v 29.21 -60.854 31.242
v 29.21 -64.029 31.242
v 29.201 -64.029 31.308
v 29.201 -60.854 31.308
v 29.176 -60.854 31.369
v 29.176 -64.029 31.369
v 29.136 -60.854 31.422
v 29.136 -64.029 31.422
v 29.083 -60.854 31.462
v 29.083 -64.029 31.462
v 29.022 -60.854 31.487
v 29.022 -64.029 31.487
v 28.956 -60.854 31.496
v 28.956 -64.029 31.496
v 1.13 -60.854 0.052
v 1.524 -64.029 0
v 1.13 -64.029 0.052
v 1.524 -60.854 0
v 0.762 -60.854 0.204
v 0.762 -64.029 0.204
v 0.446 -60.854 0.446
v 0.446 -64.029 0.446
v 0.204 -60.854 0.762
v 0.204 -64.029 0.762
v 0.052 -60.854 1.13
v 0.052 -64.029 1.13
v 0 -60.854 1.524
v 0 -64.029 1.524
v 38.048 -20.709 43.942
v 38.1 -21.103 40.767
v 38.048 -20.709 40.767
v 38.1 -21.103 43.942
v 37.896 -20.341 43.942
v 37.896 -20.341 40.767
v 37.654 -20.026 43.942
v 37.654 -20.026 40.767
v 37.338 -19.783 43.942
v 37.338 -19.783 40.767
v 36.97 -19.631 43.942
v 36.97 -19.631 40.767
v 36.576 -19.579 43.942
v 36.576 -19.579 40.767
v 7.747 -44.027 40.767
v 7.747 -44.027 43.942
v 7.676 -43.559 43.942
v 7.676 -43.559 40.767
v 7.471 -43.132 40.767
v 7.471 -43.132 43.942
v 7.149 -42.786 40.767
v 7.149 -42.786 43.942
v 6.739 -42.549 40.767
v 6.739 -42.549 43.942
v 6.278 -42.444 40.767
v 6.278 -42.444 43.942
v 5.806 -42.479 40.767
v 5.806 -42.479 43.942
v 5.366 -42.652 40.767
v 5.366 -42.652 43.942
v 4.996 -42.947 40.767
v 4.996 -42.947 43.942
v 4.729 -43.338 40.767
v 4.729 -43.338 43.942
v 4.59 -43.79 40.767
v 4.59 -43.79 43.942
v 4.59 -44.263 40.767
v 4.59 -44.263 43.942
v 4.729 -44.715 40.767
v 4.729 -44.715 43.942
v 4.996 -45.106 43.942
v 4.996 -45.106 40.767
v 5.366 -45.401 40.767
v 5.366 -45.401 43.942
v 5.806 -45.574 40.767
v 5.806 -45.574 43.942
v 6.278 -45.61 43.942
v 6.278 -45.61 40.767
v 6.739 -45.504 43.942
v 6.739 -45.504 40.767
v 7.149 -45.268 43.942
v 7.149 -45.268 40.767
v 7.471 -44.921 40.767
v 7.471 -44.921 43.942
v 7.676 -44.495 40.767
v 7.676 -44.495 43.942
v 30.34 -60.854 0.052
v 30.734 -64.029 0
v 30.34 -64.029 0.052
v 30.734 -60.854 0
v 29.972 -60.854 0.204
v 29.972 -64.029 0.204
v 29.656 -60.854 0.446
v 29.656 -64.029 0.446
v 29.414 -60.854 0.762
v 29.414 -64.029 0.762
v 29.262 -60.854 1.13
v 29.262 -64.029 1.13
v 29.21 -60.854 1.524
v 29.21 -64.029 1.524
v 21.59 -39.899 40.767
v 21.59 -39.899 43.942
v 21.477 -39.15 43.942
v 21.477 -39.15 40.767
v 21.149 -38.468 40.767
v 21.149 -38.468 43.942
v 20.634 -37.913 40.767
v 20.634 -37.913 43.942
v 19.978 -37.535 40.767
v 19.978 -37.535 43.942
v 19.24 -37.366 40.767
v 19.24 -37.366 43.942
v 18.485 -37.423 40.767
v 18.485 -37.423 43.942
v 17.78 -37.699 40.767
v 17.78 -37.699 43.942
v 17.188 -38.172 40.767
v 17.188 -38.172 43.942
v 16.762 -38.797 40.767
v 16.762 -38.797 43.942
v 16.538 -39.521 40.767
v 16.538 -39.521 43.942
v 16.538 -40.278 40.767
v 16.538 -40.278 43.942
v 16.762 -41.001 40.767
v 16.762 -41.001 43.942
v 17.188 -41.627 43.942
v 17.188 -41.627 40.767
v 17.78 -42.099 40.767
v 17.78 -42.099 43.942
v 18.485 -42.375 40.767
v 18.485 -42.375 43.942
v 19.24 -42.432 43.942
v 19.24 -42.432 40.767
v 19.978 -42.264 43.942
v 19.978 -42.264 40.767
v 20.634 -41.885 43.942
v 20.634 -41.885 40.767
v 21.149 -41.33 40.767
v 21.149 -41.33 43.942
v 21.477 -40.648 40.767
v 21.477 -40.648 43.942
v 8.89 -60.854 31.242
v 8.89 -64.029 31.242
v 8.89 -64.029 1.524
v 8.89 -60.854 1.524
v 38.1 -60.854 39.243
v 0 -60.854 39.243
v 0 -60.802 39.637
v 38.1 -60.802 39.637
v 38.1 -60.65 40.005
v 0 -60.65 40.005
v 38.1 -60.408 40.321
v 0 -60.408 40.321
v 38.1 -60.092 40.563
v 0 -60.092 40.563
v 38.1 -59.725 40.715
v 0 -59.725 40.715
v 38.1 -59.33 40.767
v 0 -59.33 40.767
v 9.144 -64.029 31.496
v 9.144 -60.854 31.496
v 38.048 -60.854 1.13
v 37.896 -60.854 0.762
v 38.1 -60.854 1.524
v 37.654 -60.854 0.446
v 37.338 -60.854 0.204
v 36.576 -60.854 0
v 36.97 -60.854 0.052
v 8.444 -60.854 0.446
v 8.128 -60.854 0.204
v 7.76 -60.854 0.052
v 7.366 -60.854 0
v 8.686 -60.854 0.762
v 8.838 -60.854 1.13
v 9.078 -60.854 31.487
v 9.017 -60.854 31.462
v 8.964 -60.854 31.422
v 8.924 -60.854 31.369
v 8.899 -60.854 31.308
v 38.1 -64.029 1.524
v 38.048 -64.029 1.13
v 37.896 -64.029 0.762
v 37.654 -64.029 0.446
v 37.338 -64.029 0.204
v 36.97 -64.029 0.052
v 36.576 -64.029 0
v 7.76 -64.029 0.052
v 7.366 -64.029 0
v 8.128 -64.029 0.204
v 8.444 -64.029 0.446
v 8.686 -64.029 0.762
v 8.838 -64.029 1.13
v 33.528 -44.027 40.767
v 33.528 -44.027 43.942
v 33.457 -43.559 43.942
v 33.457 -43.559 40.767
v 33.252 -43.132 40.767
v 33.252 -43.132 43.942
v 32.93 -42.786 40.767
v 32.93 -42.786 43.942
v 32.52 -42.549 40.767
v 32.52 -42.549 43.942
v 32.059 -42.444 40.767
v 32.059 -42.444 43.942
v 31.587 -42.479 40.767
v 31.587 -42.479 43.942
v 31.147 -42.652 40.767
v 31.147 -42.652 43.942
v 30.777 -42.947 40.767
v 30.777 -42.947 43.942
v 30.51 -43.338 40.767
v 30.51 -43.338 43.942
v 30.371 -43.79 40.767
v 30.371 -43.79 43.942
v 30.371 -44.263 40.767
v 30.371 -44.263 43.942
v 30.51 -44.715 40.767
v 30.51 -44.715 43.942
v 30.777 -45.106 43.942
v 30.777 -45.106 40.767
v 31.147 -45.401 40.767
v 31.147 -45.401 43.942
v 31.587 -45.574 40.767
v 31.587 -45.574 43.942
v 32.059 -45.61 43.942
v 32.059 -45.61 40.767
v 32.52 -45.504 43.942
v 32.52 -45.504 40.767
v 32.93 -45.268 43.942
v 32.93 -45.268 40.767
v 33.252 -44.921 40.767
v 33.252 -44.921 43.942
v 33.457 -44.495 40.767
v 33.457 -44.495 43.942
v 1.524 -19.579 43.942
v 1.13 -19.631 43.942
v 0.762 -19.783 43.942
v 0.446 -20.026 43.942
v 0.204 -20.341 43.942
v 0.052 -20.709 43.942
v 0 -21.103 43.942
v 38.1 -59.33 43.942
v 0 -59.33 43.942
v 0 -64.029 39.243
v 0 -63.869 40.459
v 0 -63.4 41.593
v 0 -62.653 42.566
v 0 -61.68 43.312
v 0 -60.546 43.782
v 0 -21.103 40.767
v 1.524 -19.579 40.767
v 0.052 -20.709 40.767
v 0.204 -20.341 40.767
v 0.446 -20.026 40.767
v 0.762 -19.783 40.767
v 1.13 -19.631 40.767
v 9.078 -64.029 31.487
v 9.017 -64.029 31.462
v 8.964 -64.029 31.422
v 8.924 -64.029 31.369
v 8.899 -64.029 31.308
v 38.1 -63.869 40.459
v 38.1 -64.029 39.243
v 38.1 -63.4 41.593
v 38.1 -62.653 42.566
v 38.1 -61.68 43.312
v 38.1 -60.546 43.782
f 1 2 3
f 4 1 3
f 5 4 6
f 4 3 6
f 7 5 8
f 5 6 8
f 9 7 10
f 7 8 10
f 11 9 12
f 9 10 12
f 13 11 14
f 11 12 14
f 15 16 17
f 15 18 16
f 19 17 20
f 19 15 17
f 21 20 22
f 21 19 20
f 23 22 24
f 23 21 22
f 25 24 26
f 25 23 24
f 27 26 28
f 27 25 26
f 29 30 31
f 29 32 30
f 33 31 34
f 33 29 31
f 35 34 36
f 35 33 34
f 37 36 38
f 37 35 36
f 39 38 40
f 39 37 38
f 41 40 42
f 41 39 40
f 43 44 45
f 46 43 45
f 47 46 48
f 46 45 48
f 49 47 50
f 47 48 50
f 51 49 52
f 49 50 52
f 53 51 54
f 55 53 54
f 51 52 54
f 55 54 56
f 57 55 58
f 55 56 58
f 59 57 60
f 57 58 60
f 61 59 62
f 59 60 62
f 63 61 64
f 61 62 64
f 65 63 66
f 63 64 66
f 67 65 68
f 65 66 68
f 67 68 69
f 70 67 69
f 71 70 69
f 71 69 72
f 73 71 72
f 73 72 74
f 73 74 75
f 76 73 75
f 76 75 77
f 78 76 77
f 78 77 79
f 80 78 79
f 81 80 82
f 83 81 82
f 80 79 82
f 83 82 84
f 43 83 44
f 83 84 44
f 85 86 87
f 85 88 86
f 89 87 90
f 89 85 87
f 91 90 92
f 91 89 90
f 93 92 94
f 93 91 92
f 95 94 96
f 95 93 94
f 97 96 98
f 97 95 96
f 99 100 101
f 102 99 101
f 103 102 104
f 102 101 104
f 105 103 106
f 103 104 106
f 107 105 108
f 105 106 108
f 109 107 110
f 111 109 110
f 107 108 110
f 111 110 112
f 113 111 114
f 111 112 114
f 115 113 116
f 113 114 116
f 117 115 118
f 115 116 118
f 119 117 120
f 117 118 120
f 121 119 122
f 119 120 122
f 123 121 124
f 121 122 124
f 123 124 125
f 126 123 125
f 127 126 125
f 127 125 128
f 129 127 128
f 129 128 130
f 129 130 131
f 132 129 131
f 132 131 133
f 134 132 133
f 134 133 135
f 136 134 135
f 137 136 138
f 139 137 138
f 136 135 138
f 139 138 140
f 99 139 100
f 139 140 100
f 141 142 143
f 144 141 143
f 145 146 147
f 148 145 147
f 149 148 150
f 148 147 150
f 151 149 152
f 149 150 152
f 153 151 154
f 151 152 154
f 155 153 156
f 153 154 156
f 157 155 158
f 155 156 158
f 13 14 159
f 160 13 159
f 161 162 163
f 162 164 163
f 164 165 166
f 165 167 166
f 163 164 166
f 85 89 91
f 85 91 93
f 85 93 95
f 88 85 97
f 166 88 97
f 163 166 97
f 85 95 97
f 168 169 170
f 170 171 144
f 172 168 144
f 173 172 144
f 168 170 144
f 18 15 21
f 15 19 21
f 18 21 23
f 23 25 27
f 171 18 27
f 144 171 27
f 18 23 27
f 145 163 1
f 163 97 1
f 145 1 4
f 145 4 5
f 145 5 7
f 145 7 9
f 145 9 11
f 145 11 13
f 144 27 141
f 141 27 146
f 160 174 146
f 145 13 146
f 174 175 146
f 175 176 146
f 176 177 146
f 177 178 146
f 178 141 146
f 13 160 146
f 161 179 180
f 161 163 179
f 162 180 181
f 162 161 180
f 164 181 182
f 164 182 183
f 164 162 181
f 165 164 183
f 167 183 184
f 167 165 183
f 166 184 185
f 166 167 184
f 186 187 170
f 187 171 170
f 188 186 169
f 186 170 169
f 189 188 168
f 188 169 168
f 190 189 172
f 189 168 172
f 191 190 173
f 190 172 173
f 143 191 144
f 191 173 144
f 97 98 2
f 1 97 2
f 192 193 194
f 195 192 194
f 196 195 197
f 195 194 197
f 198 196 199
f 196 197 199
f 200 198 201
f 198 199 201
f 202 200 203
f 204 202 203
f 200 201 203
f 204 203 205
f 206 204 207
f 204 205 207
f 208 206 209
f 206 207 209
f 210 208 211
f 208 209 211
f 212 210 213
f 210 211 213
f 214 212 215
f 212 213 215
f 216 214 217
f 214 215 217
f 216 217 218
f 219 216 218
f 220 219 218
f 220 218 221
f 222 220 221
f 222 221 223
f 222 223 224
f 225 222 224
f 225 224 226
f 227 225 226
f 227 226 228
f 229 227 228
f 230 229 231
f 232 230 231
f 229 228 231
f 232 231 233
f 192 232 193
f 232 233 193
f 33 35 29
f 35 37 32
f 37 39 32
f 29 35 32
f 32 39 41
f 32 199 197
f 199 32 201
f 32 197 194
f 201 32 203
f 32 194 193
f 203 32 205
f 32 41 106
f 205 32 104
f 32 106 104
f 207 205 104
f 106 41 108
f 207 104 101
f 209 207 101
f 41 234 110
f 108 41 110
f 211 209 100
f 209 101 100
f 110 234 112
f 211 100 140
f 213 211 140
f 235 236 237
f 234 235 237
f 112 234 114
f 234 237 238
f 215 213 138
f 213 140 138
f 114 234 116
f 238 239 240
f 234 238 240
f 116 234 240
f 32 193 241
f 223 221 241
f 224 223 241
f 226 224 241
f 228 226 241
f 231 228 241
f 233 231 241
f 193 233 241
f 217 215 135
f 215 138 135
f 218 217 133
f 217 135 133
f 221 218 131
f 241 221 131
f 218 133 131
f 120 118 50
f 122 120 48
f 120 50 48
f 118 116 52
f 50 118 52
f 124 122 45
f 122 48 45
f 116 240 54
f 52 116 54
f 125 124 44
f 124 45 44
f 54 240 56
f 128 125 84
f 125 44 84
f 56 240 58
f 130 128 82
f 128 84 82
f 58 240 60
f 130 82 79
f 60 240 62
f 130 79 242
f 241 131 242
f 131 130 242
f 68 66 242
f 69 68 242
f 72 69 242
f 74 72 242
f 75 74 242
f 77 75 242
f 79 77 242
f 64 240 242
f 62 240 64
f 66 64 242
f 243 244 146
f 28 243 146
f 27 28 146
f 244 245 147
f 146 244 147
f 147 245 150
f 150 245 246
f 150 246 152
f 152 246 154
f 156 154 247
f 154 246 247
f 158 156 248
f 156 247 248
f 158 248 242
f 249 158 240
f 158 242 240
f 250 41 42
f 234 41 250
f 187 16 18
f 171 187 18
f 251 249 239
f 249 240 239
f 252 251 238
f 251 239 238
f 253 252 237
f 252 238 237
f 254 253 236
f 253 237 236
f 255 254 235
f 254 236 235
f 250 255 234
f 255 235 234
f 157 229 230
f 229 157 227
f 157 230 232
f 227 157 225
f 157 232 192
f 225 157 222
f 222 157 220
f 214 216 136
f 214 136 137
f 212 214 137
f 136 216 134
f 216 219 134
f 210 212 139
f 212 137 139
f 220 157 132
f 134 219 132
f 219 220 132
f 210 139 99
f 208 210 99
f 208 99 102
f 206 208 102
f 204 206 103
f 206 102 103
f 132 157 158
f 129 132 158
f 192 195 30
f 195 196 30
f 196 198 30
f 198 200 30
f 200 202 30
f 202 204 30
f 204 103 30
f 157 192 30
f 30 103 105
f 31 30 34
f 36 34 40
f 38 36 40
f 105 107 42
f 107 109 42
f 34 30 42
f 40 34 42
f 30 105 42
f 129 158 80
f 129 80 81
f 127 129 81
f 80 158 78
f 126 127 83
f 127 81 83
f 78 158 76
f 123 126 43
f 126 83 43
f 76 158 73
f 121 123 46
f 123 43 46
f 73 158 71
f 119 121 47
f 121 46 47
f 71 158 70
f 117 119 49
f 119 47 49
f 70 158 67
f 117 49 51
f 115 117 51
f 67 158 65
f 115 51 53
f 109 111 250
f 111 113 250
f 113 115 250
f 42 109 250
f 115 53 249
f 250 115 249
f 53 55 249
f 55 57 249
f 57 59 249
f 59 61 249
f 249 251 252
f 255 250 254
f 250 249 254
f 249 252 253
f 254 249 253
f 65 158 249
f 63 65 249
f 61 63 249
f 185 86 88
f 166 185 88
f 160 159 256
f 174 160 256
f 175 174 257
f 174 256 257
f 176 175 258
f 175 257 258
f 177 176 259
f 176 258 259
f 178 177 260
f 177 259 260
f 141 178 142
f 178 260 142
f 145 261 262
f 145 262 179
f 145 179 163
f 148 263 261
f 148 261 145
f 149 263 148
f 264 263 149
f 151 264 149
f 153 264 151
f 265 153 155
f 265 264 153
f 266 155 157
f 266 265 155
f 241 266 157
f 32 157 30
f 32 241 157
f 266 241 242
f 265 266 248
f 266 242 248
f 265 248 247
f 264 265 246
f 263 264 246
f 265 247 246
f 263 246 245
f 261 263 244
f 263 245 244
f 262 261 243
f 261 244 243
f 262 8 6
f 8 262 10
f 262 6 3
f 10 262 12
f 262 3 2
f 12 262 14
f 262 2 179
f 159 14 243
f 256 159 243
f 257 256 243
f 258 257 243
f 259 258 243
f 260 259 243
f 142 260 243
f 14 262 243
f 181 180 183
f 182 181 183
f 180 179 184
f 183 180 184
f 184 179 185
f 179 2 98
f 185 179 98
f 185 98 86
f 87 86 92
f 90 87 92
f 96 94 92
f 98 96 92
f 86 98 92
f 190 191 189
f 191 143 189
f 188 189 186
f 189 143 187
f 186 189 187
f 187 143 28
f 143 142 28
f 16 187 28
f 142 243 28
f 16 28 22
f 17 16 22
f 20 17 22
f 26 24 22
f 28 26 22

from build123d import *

# Parameters (mm, degrees)
F1_DEPTH = 38.1
F3_DEPTH = 3.175
F4_R     = 1.524
F5_R     = 2.54
F5_R_2   = 1.5875
F6_DEPTH = 3.175
F7_W     = 70.9456168115
F7_H     = 45.830719173
F8_DEPTH = 19.05
F9_R     = 1.524


with BuildPart() as f1:
    # F0 (on Right) → F1 (new body)
    with BuildSketch(Plane.YZ):
        with BuildLine():
            Line((-64.0291666667, 0), (-60.8541666667, 0))
            Line((-60.8541666667, 0), (-60.8541666667, 39.243))
            ThreePointArc((-60.8541666667, 39.243), (-60.4077974012, 40.3206307345), (-59.3301666667, 40.767))
            Line((-59.3301666667, 40.767), (-0.5291666667, 40.767))
            Line((-0.5291666667, 40.767), (-0.5291666667, 43.942))
            Line((-0.5291666667, 43.942), (-59.3301666667, 43.942))
            ThreePointArc((-59.3301666667, 43.942), (-62.6528614315, 42.5656947648), (-64.0291666667, 39.243))
            Line((-64.0291666667, 39.243), (-64.0291666667, 0))
        make_face()
    extrude(amount=F1_DEPTH)

    # F2 (on face) → F3 (cut, through all)
    with BuildSketch(Plane.XZ.offset(64.0291666667)):
        with BuildLine():
            Line((8.89, 31.242), (8.89, 0))
            Line((8.89, 0), (29.21, 0))
            Line((29.21, 0), (29.21, 31.242))
            ThreePointArc((29.21, 31.242), (29.1356051224, 31.4216051224), (28.956, 31.496))
            Line((28.956, 31.496), (9.144, 31.496))
            ThreePointArc((9.144, 31.496), (8.9643948776, 31.4216051224), (8.89, 31.242))
        make_face()
    extrude(amount=-F3_DEPTH, mode=Mode.SUBTRACT)

    # F4
    f4_edges = [f1.edges().sort_by_distance(p)[0] for p in [
        (8.89, -62.441667, 0),
        (0, -62.441667, 0),
        (29.21, -62.441667, 0),
        (38.1, -62.441667, 0),
        (38.1, -0.529167, 42.3545),
        (0, -0.529167, 42.3545),
    ]]
    fillet(f4_edges, radius=F4_R)

    # F5 (on face) → F6 (cut, through all)
    with BuildSketch(Plane.XY.offset(43.942)):
        with Locations((19.05, -8.1491666667)):
            Circle(F5_R)
        with Locations((19.05, -39.8991666667)):
            Circle(F5_R)
        with Locations((31.9405, -44.0266666667)):
            Circle(F5_R_2)
        with Locations((6.1595, -44.0266666667)):
            Circle(F5_R_2)
    extrude(amount=-F6_DEPTH, mode=Mode.SUBTRACT)

    # F7 (on face) → F8 (cut)
    with BuildSketch(Plane(origin=(0, -0.5291666667, 0), x_dir=(-1, 0, 0), z_dir=(0, 1, 0))):
        with Locations((-19.1829390824, 42.4401424825)):
            Rectangle(F7_W, F7_H)
    extrude(amount=-F8_DEPTH, mode=Mode.SUBTRACT)

    # F9
    f9_edges = [f1.edges().sort_by_distance(p)[0] for p in [
        (38.1, -19.579167, 42.3545),
        (0, -19.579167, 42.3545),
    ]]
    fillet(f9_edges, radius=F9_R)


solid = f1.part
